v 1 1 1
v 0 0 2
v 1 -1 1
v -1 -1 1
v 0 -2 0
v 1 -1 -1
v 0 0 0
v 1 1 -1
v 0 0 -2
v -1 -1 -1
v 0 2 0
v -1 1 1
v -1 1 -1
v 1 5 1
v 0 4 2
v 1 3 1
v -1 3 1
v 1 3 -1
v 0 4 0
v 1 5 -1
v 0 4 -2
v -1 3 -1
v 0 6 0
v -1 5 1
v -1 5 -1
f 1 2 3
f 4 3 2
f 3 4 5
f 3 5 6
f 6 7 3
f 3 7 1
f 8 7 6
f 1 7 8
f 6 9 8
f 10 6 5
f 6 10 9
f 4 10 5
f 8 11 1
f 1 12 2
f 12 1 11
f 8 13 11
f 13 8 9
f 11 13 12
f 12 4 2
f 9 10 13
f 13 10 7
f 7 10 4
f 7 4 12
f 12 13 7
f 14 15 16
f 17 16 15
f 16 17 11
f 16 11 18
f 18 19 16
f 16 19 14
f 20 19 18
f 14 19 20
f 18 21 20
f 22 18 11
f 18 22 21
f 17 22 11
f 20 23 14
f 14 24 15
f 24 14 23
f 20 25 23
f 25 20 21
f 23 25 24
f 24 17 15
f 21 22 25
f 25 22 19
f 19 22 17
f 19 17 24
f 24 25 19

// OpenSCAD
pointA=[0,	0,	2]; // 0
pointB=[1,	1,	1]; // 1
pointC=[1,	-1,	1]; // 2
pointD=[-1,	-1,	1]; // 3
pointE=[-1,	1,	1]; // 4
pointF=[0,	2,	0]; // 5
pointG=[0,	0,	0]; // 6
pointH=[0,	-2,	0]; // 7
pointJ=[1,	1,	-1]; // 8
pointK=[1,	-1,	-1]; // 9
pointL=[-1,	-1,	-1]; // 10
pointM=[-1,	1,	-1]; // 11
pointN=[0,	0,	-2]; // 12
pointO=[0.00001,	0,	0]; // 13 - point 6 moved slightly on the x plane to fix openscad stl error

module RhombicDodecahemioctahedron() {
polyhedron ( 	
	points=[pointA,pointB,pointC,pointD,pointE,pointF,pointG,pointH,pointJ,pointK,pointL,pointM,pointN,pointO],
	triangles=[	[0,2,1],[0,3,2],[2,3,7],[7,9,2],[9,6,2],[2,6,1],[9,8,6],[8,1,6],[9,12,8],[9,10,12],[9,7,10],[7,3,10],
			[8,5,1],[1,5,4],[1,4,0],[5,8,11],[8,12,11],[4,5,11],[0,4,3],[10,11,12],[10,13,11],[10,3,13],[4,13,3],[4,11,13]
			]
);
}

color([0.5,0.5,0.8,0.6]) RhombicDodecahemioctahedron();
translate([0,4,0])color([0.5,0.5,0.8,1]) RhombicDodecahemioctahedron();
